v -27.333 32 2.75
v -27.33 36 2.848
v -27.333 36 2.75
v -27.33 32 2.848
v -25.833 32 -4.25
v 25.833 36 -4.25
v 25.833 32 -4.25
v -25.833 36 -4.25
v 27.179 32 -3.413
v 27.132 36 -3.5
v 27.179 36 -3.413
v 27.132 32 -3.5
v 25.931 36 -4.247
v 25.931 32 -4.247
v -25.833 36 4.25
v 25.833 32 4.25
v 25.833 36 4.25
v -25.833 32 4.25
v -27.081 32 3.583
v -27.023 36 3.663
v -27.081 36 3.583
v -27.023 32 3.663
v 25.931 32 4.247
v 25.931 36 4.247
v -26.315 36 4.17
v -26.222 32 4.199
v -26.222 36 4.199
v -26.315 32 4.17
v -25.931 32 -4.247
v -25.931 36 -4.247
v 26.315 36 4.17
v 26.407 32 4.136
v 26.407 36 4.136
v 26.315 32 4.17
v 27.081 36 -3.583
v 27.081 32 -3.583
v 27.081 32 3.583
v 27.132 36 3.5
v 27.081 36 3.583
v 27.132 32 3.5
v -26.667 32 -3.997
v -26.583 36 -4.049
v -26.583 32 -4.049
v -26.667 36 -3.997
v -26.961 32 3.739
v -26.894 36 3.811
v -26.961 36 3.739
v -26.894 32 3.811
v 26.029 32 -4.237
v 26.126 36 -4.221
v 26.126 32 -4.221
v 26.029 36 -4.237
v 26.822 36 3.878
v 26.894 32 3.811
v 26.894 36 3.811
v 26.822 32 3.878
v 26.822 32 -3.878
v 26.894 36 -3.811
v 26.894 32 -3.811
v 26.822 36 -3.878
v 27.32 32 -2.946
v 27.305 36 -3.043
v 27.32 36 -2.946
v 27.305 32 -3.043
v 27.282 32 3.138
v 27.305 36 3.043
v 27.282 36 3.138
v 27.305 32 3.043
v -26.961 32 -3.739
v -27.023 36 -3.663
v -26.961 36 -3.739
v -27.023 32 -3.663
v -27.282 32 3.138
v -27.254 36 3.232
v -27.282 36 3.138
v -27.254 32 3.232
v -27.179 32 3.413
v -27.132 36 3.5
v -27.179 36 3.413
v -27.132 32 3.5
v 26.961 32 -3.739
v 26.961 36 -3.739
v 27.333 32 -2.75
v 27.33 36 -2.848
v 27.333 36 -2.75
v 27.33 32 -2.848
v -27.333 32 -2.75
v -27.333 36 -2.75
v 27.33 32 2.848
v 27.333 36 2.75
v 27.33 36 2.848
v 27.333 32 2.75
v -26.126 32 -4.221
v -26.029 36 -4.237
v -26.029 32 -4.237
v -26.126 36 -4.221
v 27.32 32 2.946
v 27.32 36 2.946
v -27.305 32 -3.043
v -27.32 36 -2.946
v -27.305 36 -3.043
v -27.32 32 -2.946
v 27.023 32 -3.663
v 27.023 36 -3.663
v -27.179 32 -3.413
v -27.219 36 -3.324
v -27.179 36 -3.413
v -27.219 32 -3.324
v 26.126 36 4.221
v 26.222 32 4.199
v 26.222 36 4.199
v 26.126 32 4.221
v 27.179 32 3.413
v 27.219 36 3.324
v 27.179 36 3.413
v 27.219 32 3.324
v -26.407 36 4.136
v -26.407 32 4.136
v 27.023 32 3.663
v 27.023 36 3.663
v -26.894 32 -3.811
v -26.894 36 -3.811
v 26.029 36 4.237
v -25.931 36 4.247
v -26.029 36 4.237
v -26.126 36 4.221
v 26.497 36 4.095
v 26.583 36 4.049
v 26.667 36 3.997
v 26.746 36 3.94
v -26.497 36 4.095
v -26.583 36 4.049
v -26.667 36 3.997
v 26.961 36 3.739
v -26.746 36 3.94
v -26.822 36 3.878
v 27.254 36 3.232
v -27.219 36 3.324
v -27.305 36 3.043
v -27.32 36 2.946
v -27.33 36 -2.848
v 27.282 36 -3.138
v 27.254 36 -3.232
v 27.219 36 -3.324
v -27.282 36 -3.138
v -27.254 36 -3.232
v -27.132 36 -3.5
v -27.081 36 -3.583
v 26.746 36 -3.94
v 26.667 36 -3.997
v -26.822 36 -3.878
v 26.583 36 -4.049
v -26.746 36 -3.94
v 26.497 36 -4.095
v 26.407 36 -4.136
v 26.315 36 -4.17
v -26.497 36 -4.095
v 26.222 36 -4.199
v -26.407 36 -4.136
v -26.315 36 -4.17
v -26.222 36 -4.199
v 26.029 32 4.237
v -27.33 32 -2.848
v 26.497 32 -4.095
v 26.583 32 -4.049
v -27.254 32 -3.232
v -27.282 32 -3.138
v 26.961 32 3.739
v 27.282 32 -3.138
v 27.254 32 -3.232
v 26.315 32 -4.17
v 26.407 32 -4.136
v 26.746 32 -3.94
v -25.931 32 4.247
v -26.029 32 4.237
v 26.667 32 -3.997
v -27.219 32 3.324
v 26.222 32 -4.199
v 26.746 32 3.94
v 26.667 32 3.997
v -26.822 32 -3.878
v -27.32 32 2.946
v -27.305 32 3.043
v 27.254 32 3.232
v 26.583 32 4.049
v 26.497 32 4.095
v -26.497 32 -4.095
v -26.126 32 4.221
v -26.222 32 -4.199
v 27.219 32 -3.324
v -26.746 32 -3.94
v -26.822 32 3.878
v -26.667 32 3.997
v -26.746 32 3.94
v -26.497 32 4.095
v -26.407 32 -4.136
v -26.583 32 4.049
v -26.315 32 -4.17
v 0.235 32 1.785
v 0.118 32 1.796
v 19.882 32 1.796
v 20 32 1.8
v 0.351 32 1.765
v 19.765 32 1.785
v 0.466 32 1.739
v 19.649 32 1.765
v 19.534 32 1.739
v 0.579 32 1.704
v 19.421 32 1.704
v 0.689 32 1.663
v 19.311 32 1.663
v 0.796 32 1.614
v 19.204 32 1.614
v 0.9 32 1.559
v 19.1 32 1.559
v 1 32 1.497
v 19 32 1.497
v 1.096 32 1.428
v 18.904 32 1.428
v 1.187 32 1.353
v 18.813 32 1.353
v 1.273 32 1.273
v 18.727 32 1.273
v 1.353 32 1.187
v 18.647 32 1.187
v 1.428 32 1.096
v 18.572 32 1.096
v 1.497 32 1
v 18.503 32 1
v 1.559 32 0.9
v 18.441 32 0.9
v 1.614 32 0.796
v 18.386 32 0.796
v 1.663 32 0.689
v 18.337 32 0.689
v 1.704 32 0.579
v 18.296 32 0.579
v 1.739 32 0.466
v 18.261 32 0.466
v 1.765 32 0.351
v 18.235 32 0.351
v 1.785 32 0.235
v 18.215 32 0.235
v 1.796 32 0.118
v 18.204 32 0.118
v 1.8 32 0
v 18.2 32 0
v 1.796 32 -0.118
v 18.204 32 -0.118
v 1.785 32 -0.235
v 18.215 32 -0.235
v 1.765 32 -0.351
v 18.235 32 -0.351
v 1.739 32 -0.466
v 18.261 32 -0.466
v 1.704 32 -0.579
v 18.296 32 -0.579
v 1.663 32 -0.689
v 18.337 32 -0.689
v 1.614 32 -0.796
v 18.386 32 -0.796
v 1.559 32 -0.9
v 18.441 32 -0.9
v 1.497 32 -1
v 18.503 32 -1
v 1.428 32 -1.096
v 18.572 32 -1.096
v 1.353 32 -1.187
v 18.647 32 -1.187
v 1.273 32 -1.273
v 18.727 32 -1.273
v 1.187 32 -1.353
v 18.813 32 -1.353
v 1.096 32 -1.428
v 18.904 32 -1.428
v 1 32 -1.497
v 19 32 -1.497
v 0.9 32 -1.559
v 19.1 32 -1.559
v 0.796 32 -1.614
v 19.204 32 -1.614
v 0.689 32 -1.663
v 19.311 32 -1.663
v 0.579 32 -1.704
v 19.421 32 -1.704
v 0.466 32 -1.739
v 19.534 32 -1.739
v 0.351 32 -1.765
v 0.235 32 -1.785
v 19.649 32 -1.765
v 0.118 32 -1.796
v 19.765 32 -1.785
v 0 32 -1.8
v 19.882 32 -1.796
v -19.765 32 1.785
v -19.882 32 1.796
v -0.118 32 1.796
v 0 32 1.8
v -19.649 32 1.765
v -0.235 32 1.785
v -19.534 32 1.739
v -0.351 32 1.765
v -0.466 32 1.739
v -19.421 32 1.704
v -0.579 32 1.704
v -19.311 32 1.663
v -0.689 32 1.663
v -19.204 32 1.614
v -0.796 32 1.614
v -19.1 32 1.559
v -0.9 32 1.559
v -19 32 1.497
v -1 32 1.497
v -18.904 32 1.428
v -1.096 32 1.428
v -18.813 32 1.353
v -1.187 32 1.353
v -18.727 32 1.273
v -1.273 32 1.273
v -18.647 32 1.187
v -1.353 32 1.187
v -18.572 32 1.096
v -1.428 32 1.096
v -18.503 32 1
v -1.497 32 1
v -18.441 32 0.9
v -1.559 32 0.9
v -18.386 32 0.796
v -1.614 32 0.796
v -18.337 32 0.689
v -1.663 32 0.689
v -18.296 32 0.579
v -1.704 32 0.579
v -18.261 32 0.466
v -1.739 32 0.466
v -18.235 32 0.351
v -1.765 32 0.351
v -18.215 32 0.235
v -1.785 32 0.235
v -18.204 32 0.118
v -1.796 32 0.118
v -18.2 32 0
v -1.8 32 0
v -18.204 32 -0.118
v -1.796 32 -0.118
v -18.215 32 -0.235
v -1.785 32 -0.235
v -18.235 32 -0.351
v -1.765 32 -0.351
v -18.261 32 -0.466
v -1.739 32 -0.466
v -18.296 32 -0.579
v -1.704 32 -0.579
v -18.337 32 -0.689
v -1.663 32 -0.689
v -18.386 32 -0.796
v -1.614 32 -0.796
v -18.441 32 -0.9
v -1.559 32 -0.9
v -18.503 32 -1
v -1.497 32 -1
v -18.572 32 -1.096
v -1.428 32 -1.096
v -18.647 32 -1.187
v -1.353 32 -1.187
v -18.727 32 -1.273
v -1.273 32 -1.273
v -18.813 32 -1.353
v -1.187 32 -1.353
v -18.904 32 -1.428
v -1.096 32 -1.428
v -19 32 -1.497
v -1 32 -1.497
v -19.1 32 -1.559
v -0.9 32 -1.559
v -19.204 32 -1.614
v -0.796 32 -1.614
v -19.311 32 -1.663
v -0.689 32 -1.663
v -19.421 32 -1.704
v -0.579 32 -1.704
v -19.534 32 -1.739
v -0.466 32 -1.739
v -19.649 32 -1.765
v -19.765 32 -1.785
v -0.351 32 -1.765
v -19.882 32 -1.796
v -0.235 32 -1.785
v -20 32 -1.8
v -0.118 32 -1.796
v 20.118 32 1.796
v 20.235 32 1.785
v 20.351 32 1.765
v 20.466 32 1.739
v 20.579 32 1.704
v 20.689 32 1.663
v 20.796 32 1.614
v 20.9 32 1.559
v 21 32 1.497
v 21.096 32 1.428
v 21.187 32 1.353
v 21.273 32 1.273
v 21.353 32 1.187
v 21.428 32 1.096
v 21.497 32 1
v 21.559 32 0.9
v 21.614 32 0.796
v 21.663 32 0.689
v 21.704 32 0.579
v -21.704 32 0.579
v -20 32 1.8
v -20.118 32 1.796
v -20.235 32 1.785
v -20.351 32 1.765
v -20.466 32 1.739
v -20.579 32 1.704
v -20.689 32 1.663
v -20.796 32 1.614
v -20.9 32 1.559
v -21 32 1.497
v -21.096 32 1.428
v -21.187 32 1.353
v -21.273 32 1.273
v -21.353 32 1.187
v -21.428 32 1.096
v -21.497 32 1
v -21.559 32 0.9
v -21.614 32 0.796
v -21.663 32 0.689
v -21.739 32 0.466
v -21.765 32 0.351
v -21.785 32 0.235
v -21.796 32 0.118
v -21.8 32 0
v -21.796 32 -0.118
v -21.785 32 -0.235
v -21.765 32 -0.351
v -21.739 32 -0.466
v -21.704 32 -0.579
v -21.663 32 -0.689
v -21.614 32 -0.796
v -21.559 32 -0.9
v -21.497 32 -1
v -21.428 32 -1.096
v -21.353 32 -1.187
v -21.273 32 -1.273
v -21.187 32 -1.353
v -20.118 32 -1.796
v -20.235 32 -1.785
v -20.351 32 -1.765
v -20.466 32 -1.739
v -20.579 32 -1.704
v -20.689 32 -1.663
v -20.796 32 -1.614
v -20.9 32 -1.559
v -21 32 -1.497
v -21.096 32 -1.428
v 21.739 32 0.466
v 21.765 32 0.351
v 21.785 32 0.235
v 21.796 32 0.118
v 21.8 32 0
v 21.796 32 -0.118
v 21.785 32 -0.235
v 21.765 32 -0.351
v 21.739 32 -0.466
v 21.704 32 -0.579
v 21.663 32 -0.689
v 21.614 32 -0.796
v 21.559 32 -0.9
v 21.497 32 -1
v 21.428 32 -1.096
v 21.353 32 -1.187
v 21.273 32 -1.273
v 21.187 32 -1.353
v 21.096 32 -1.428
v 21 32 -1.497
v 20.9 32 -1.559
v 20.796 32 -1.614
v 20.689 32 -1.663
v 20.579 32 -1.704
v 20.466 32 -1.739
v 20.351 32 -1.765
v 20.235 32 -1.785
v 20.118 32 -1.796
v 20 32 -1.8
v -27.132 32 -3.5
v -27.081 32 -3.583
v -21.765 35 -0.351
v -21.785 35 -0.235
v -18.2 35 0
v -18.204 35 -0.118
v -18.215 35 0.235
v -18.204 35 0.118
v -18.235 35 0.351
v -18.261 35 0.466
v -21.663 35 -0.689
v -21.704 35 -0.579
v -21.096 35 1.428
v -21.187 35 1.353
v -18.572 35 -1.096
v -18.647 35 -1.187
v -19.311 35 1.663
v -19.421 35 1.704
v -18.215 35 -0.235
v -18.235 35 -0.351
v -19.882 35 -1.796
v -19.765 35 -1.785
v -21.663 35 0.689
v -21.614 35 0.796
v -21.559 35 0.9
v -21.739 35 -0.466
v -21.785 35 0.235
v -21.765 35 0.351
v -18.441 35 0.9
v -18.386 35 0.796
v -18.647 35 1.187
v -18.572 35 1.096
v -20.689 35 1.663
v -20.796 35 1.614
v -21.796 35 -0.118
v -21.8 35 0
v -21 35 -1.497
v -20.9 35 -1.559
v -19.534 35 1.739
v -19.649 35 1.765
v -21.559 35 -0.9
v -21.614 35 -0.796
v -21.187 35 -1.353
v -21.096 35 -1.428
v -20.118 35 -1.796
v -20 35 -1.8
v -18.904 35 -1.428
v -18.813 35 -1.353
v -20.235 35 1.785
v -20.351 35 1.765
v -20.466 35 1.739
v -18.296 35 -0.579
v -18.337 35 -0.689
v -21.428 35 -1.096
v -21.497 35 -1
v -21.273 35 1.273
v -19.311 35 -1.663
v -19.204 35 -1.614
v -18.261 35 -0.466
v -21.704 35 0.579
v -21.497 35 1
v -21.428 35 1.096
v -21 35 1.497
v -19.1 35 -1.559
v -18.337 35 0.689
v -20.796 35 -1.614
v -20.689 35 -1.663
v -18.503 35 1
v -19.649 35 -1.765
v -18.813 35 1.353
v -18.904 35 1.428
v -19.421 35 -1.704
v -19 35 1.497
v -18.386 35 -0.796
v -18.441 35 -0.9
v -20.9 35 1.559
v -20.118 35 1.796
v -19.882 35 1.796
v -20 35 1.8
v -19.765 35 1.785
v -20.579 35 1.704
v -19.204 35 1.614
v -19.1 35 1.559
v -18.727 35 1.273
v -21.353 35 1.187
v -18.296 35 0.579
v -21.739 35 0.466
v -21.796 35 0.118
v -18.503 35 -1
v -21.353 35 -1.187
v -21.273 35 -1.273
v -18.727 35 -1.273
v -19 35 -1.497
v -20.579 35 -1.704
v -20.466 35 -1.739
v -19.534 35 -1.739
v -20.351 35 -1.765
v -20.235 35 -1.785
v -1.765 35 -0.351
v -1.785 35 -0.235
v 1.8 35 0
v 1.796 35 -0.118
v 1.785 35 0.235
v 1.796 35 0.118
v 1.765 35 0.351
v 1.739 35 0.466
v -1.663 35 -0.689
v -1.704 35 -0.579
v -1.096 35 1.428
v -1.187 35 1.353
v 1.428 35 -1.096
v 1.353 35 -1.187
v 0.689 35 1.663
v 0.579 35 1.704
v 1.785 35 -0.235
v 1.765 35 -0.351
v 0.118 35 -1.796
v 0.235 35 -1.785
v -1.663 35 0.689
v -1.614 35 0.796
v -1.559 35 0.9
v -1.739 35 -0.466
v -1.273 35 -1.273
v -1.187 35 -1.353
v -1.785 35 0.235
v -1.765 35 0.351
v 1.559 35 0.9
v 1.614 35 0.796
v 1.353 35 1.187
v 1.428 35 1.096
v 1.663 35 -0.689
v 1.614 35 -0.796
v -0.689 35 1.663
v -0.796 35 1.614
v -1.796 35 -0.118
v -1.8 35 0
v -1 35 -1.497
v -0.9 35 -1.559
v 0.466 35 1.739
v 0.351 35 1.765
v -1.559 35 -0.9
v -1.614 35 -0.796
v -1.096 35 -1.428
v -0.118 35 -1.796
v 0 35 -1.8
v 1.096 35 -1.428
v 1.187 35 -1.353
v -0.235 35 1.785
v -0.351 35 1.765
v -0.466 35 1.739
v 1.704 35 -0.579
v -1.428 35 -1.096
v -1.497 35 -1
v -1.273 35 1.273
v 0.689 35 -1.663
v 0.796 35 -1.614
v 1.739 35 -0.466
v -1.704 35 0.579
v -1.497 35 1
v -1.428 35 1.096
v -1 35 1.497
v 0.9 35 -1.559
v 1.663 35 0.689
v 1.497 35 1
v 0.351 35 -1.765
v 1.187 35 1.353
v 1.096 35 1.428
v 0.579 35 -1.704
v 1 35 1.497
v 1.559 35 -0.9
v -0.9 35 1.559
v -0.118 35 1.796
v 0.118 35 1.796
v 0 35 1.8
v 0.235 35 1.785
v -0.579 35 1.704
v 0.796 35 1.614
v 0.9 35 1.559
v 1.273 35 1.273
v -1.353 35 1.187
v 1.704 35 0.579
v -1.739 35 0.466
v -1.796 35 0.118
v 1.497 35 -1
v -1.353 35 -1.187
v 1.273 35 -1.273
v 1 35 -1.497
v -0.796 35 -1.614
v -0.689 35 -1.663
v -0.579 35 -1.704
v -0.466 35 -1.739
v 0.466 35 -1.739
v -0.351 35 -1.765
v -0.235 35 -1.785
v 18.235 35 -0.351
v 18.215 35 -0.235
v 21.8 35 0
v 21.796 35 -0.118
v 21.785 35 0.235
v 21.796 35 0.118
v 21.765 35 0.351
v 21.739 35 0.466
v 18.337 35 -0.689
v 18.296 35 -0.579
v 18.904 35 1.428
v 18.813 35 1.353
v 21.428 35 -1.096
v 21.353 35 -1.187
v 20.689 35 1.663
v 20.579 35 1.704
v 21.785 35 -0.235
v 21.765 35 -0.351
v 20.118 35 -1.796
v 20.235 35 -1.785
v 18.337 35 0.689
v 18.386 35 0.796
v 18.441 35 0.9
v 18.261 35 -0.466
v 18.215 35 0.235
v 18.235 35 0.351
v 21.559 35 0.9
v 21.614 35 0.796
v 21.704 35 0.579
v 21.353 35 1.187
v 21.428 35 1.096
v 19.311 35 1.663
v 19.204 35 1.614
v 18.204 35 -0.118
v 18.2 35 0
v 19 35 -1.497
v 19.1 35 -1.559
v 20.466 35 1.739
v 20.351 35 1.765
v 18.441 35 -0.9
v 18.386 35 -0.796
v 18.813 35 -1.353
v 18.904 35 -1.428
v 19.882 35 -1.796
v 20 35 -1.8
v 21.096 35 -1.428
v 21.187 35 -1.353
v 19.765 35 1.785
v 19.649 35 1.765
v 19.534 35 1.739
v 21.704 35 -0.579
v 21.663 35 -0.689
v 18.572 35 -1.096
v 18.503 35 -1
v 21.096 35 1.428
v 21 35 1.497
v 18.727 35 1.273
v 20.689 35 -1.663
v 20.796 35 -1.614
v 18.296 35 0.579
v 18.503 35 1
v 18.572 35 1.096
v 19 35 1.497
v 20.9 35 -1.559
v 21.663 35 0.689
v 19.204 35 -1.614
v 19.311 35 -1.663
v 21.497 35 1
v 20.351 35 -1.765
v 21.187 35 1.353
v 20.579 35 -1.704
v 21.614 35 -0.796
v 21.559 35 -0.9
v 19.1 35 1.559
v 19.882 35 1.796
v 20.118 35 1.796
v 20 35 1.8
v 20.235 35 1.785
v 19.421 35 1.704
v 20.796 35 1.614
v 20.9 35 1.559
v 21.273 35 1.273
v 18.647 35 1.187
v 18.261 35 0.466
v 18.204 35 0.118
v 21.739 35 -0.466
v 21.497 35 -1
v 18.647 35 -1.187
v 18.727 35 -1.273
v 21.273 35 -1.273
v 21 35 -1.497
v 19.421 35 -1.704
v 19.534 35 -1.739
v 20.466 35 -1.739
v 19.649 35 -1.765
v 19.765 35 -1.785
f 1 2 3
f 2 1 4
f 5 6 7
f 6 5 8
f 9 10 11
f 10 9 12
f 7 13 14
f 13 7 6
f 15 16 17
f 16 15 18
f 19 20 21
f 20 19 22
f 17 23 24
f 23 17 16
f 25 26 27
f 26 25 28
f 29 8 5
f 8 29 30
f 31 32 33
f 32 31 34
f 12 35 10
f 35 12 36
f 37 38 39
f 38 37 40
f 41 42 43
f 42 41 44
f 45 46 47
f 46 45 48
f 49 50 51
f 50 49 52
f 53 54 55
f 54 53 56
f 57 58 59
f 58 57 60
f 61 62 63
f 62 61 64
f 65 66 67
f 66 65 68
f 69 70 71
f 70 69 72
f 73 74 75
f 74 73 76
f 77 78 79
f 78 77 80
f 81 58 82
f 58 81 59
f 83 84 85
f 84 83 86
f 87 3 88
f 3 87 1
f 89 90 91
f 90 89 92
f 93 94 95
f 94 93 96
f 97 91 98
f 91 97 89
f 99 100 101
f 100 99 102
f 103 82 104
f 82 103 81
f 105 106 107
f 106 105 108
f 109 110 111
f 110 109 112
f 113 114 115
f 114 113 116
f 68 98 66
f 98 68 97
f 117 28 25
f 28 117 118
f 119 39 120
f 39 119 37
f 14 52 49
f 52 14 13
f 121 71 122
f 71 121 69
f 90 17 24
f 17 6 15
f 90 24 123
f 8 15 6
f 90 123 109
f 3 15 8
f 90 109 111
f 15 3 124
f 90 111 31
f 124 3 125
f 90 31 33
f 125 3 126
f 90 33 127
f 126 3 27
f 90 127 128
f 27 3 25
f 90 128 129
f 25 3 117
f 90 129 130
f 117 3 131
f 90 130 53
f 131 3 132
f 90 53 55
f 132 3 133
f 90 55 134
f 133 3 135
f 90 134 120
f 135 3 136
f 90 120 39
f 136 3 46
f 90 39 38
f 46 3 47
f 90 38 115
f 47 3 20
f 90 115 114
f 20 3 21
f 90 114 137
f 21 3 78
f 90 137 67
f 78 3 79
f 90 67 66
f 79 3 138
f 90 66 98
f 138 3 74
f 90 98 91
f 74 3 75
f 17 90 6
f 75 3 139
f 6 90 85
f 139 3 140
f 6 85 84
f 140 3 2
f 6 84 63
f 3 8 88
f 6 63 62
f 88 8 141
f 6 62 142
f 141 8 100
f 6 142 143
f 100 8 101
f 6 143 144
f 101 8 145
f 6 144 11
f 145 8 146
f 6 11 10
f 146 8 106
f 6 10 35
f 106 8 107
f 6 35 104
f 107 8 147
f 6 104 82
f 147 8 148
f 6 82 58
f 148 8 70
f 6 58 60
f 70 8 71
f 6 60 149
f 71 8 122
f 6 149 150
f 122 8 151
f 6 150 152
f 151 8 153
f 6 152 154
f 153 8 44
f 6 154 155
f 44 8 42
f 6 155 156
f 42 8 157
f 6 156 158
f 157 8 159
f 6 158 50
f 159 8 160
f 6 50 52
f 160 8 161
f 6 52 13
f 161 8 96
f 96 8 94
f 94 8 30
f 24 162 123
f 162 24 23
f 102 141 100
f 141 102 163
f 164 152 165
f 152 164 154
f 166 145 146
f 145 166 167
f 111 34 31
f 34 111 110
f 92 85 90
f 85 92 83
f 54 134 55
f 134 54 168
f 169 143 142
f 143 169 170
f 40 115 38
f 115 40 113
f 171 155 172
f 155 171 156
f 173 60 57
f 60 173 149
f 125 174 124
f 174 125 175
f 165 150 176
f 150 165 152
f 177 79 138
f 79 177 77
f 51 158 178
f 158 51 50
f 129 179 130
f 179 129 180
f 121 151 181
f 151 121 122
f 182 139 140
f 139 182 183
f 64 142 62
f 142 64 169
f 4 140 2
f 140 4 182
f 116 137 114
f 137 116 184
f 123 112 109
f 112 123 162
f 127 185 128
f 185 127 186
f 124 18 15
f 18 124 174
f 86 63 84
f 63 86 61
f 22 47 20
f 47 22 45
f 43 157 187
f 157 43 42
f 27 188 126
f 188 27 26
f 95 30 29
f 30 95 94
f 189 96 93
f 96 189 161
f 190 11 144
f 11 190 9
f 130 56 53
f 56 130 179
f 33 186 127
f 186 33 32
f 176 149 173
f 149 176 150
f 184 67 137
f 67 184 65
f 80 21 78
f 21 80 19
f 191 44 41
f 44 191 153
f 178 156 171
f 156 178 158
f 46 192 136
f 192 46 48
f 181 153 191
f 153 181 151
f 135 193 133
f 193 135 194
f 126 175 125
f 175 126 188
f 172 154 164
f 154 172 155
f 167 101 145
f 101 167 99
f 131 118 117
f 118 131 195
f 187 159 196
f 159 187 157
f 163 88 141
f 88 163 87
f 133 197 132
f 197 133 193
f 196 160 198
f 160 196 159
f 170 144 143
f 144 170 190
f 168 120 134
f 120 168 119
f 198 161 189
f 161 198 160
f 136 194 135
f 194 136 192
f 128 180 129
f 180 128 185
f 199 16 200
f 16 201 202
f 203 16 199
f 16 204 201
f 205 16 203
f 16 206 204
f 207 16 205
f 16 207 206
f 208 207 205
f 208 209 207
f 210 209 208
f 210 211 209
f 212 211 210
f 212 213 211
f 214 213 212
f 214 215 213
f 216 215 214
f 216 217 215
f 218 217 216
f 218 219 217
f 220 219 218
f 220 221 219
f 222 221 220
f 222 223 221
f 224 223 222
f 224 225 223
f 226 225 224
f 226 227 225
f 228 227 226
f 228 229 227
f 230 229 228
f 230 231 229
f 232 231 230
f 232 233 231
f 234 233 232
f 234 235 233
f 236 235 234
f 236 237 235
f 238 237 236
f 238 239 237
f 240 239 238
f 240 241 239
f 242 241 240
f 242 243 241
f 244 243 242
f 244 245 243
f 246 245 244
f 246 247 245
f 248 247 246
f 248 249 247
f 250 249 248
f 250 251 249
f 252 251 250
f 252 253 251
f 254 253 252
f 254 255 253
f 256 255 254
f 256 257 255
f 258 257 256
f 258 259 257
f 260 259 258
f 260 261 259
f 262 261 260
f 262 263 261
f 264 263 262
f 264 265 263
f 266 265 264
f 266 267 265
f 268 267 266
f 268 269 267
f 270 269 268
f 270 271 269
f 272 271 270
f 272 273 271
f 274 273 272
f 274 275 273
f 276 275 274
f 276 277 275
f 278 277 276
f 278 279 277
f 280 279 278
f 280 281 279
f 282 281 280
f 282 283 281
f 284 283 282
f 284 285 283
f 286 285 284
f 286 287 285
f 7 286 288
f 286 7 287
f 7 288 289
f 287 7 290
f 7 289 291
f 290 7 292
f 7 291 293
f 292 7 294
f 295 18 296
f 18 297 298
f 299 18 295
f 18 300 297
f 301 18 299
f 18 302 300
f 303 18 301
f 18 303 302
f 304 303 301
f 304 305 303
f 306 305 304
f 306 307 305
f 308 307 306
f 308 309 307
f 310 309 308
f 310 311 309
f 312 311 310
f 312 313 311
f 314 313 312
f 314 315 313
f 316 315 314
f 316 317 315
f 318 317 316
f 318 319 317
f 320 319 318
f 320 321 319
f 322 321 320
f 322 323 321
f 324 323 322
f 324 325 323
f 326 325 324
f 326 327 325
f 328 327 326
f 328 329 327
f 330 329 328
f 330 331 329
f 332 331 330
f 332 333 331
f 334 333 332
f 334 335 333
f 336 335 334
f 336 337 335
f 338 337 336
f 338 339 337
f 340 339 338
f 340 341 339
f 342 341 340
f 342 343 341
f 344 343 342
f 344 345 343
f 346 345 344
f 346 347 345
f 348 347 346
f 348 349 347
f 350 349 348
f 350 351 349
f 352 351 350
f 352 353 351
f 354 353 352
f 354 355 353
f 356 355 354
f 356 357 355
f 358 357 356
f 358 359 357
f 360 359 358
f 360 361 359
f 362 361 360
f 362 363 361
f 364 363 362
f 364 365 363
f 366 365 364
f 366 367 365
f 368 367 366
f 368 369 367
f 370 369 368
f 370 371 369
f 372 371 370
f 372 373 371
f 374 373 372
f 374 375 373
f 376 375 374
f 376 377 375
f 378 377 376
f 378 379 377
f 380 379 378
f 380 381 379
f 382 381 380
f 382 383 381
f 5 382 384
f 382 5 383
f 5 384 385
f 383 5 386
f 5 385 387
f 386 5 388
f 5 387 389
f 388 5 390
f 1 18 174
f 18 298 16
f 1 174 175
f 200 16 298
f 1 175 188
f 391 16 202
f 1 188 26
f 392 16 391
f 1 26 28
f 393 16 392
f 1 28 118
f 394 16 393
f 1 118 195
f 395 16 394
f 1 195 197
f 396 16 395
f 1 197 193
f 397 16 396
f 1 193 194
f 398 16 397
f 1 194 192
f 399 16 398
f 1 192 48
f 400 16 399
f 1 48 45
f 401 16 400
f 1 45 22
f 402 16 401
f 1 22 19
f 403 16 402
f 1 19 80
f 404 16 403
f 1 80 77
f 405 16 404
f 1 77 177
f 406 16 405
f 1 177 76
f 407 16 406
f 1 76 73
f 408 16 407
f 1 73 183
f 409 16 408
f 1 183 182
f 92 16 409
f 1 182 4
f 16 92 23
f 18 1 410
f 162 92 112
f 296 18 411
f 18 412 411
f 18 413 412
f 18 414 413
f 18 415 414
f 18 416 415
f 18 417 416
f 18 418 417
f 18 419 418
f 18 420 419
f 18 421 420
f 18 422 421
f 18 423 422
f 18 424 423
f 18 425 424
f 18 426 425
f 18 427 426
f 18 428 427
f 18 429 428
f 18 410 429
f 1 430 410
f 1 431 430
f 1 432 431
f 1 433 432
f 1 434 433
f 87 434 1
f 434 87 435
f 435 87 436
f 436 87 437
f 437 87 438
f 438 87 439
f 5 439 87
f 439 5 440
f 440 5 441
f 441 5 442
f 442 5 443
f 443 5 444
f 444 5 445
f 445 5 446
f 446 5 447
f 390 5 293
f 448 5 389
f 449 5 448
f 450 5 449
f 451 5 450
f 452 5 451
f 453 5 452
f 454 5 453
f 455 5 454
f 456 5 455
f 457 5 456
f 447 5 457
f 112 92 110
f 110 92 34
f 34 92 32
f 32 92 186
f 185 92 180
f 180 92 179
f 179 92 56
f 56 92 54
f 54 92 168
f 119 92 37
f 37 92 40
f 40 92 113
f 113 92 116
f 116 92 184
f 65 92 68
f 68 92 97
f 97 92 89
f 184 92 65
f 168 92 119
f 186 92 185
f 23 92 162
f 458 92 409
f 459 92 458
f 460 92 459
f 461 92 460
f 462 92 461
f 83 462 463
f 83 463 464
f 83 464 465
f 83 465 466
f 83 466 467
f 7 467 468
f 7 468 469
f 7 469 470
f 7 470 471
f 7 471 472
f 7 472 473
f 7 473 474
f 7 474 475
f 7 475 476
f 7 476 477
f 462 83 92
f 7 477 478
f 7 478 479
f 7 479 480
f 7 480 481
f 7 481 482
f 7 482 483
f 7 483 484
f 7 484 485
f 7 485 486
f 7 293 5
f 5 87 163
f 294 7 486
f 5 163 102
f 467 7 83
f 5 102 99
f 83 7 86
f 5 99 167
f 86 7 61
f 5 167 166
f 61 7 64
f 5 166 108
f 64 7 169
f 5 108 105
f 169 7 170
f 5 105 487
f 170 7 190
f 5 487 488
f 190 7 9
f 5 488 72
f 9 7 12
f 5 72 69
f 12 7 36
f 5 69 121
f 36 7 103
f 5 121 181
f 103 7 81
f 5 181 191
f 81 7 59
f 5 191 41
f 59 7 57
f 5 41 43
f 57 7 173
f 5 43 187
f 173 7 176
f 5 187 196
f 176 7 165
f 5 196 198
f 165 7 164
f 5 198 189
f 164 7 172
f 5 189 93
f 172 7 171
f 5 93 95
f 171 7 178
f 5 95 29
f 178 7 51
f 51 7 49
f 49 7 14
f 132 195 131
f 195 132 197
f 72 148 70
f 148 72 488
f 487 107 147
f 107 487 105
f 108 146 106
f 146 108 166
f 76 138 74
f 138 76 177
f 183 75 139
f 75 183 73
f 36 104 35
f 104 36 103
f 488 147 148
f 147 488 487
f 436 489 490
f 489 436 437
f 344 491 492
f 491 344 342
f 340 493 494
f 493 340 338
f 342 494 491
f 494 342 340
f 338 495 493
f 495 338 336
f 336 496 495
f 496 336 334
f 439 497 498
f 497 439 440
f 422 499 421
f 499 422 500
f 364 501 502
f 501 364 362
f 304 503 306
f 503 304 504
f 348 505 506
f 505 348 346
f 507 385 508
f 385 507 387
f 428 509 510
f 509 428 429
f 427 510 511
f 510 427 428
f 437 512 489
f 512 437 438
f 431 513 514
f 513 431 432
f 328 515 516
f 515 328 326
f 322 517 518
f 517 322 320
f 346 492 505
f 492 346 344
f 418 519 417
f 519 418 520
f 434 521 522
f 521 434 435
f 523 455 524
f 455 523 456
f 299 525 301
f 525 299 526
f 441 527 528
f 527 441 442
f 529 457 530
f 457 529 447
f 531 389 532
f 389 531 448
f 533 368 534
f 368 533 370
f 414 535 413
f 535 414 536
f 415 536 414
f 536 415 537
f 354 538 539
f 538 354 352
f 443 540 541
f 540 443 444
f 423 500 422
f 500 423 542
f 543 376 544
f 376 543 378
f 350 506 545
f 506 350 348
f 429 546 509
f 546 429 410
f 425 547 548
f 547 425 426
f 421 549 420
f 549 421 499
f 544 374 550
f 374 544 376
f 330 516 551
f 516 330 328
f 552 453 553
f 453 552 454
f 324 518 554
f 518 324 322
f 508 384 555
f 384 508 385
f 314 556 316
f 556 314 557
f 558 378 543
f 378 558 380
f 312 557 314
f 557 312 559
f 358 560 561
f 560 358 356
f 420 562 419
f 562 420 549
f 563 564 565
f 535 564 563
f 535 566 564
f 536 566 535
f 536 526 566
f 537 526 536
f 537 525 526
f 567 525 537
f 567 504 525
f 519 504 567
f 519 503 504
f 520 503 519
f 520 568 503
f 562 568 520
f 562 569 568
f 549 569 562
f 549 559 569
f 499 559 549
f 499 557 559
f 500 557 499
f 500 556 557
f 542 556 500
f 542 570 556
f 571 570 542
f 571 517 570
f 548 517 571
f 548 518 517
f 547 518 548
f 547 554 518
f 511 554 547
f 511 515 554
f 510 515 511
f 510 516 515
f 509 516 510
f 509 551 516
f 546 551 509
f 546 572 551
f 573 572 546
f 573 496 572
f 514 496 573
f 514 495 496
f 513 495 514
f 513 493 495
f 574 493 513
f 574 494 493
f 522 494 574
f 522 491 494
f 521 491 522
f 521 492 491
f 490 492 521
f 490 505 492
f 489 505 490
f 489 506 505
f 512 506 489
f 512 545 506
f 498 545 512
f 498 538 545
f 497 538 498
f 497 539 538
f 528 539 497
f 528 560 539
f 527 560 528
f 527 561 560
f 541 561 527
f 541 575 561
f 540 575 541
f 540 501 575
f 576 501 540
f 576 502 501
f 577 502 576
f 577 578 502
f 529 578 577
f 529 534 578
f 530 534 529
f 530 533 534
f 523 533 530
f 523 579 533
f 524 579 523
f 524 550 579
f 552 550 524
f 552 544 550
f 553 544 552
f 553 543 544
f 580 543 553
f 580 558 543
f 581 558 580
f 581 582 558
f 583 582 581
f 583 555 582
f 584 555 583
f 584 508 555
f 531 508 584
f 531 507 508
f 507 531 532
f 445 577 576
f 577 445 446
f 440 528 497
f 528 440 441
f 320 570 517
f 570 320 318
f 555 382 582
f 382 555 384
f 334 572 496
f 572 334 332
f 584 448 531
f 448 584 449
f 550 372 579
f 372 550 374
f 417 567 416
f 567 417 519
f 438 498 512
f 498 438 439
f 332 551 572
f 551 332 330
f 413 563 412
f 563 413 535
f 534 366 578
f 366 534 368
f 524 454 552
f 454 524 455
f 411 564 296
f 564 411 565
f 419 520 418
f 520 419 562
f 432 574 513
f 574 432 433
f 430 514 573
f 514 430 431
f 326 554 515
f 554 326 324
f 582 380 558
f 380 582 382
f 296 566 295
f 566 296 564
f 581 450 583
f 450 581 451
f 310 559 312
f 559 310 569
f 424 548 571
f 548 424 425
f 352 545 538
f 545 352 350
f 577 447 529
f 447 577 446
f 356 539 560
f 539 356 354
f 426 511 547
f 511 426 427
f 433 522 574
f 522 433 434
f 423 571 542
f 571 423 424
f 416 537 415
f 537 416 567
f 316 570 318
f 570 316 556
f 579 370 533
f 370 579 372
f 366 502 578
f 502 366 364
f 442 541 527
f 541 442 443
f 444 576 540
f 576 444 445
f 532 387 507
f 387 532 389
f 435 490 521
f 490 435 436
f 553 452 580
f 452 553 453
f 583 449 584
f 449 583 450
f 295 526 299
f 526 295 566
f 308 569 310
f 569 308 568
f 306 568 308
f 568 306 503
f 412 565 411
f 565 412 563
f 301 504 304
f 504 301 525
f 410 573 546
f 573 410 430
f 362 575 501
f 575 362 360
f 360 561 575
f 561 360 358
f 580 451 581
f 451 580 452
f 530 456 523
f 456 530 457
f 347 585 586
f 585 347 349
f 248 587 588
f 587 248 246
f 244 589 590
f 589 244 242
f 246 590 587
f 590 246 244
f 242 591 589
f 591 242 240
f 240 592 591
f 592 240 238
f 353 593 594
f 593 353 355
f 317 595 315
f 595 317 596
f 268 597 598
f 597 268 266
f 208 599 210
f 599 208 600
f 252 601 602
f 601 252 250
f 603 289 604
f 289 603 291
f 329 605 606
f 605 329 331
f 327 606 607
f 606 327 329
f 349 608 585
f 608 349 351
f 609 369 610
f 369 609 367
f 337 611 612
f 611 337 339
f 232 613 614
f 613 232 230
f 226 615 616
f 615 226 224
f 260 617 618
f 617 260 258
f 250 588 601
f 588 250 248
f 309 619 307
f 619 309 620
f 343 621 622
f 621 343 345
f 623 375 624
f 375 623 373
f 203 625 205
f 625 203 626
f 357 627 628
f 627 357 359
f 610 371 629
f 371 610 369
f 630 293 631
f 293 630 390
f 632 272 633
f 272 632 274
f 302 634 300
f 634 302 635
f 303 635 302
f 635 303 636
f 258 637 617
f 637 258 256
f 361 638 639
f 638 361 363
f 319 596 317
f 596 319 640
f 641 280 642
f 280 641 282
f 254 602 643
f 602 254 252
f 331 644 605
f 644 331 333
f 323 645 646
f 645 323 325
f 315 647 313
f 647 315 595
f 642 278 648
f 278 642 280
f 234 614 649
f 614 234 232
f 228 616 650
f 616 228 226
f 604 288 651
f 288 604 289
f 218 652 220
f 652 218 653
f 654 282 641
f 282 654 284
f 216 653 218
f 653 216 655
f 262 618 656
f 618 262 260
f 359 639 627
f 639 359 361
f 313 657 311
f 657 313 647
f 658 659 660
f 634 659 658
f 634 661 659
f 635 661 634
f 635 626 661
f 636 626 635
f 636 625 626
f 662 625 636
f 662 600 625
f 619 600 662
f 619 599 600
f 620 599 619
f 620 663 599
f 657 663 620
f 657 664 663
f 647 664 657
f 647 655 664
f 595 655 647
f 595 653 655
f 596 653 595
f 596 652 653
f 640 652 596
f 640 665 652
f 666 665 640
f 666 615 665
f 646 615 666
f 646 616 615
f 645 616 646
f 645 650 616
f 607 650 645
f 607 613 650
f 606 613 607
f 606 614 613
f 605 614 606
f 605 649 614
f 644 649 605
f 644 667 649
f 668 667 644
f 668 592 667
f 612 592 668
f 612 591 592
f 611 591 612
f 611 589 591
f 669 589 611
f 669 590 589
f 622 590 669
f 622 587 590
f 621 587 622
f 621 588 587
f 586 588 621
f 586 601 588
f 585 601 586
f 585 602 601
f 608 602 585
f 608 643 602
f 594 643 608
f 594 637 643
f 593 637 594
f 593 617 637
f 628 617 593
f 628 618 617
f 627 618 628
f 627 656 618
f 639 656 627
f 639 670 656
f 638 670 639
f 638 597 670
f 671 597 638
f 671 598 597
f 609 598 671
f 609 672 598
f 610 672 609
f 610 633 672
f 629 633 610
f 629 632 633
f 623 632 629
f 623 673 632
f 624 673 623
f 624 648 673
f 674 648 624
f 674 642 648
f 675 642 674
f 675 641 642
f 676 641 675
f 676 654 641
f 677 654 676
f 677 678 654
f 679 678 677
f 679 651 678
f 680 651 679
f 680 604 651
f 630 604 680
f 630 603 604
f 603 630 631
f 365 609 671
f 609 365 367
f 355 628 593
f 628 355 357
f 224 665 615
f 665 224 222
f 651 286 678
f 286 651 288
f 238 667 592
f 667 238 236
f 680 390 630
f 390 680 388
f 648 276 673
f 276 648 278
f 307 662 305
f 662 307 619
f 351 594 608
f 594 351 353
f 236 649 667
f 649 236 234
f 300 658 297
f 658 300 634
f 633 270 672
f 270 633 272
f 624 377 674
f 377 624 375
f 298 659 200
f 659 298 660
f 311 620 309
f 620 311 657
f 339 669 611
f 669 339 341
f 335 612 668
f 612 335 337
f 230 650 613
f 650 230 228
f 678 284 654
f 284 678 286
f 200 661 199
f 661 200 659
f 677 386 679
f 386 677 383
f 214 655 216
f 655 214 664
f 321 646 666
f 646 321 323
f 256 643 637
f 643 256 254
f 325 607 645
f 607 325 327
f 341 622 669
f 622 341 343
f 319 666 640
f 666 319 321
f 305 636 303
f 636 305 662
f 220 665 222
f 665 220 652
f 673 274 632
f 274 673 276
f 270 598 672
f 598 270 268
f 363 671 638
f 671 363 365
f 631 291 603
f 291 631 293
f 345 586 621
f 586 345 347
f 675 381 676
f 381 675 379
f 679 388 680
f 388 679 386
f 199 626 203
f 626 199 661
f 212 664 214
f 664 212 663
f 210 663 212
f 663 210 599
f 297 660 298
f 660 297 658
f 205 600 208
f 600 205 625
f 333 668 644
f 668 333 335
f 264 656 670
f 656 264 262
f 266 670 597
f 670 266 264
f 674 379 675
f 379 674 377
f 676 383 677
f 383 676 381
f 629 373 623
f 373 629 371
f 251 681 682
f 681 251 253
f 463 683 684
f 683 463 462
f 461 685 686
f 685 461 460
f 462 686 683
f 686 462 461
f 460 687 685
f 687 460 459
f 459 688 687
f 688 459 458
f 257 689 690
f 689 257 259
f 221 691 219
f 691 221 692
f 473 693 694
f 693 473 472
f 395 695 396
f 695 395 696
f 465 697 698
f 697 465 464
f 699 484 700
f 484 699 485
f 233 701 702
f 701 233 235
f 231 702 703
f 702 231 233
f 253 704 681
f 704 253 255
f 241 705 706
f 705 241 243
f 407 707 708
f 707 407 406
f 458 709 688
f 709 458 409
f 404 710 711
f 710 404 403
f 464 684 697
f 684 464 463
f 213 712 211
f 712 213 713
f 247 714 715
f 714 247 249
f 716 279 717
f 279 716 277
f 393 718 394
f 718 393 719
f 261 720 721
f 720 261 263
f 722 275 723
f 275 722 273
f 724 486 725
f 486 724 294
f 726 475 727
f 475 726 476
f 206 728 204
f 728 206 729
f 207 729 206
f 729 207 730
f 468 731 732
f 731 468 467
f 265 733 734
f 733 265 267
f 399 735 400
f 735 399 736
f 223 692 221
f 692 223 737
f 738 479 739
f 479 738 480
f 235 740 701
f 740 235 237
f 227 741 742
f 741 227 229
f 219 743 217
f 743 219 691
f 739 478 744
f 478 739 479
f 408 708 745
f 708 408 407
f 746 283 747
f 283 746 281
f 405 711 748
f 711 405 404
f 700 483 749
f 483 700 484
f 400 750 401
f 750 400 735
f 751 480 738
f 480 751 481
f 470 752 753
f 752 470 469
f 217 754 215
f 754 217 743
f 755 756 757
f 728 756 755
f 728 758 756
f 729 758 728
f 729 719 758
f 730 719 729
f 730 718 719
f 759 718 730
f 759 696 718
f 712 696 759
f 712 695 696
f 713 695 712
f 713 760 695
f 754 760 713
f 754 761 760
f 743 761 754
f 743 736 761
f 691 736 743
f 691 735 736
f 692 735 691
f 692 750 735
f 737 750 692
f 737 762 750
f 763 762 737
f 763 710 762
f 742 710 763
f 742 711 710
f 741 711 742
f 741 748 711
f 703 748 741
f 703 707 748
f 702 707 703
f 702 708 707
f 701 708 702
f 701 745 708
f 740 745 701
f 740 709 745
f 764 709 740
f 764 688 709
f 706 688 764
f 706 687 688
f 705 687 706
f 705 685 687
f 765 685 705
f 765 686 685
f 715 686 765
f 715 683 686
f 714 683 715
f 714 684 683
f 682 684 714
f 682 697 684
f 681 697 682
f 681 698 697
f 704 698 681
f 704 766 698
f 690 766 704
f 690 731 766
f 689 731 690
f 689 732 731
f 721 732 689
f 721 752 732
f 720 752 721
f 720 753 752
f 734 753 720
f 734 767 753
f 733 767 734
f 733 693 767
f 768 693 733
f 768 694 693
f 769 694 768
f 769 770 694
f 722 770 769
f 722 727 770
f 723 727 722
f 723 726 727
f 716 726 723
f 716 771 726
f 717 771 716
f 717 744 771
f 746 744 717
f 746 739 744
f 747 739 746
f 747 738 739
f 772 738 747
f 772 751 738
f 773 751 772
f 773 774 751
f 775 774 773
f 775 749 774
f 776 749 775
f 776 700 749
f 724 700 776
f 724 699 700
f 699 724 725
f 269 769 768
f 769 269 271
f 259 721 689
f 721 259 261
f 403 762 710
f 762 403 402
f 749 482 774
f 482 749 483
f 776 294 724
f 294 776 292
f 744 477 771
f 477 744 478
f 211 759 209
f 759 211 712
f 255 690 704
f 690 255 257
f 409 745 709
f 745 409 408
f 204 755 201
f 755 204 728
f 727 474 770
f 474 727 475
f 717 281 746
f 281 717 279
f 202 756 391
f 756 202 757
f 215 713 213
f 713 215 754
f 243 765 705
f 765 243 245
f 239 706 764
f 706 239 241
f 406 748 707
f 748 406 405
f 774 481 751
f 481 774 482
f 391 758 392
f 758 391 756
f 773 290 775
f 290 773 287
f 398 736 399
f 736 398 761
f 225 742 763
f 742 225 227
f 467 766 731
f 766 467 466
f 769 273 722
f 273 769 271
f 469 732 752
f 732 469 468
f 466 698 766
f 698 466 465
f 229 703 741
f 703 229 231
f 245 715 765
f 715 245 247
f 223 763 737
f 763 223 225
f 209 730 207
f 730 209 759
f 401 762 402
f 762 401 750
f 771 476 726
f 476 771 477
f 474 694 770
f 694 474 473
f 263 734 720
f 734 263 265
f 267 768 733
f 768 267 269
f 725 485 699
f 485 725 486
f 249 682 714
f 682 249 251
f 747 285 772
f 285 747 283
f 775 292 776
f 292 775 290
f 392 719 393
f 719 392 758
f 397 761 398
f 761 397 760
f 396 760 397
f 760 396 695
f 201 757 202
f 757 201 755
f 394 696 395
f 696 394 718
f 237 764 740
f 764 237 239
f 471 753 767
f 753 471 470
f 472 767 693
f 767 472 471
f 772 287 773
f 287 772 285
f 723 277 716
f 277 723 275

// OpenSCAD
projectWidth=58;
projectHeight=29;
projectDepth=26;
holeDis=3;

caseWidthB=80;
caseHeightB=40;
caseDepthB=28;

caseWidthT=80;
caseHeightT=40;
caseDepthT=2;

dispayWidth=48;
displayHeight=16;



/*********************** MAIN ************************************/

/* *
difference() {	
	bottomCase(caseWidthB,caseHeightB,caseDepthB);
	translate([0,-2,0]) firebeetle(projectWidth+1,projectHeight+1,projectDepth+2,holeDis,false,dispayWidth,displayHeight+1);
}
/* */

/* *
difference() {
	translate([0,0,10]) topCase(caseWidthT,caseHeightT,caseDepthT);
	translate([0,-2,5]) firebeetle(projectWidth+1,projectHeight+1,projectDepth+2,holeDis,false,dispayWidth,displayHeight+1);
}
/* */

/* */
translate([0,15.5,0]) snooze(caseWidthB-1,caseHeightB-1);
/* */

/*********************** MODULE **********************************/

module firebeetle(x,y,z,hd,hole,dW,dH) {
	color("blue")
	difference() {
		translate([0,0,3.5]) cube([x,y,z-7],center=true); // firebeetle ESP32+matrix
		if (hole) {
			translate([(x/2)-hd,(y/2)-hd,0]) cylinder(r=1.3, h=z+4, center=true, $fn=96);
			translate([-(x/2)+hd,(y/2)-hd,0]) cylinder(r=1.3, h=z+4, center=true, $fn=96);
			translate([(x/2)-hd,-(y/2)+hd,0]) cylinder(r=1.3, h=z+4, center=true, $fn=96);
			translate([-(x/2)+hd,-(y/2)+hd,0]) cylinder(r=1.3, h=z+4, center=true, $fn=96);
		}
	}
	if (!hole) {
		translate([(x/2)-hd,(y/2)-hd,0]) cylinder(r=1.3, h=z, center=true, $fn=96);
		translate([-(x/2)+hd,(y/2)-hd,0]) cylinder(r=1.3, h=z, center=true, $fn=96);
		translate([(x/2)-hd,-(y/2)+hd,0]) cylinder(r=1.3, h=z, center=true, $fn=96);
		translate([-(x/2)+hd,-(y/2)+hd,0]) cylinder(r=1.3, h=z, center=true, $fn=96);
	}
	
	hull() {
		translate([(dW/2),(dH/2),(z/2)+5]) cylinder(r=1.5, h=10, center=true, $fn=96);
		translate([-(dW/2),(dH/2),(z/2)+5]) cylinder(r=1.5, h=10, center=true, $fn=96);
		translate([(dW/2),-(dH/2),(z/2)+5]) cylinder(r=1.5, h=10, center=true, $fn=96);
		translate([-(dW/2),-(dH/2),(z/2)+5]) cylinder(r=1.5, h=10, center=true, $fn=96);
	}
}

module bottomCase(x,y,z) {
	color("white")
		difference() {
			hull() {
				translate([(x/2),(y/2),-(z-projectDepth)/2]) cylinder(r=1.5, h=z, center=true, $fn=96);
				translate([-(x/2),(y/2),-(z-projectDepth)/2]) cylinder(r=1.5, h=z, center=true, $fn=96);
				translate([(x/2),-(y/2),-(z-projectDepth)/2]) cylinder(r=1.5, h=z, center=true, $fn=96);
				translate([-(x/2),-(y/2),-(z-projectDepth)/2]) cylinder(r=1.5, h=z, center=true, $fn=96);
			}
			
			hull() {
				translate([(x/2)-1.5,(y/2)-(holeDis*2)-2,0]) cylinder(r=1.5, h=z, center=true, $fn=96);
				translate([-(x/2)+1.5,(y/2)-(holeDis*2)-2,0]) cylinder(r=1.5, h=z, center=true, $fn=96);
				translate([(x/2)-1.5,-(y/2)+(holeDis*2),0]) cylinder(r=1.5, h=z, center=true, $fn=96);
				translate([-(x/2)+1.5,-(y/2)+(holeDis*2),0]) cylinder(r=1.5, h=z, center=true, $fn=96);
			}
			hull() {
				translate([(x/2)-(holeDis*2)-1.5,(y/2)-2,0]) cylinder(r=1.5, h=z, center=true, $fn=96);
				translate([-(x/2)+(holeDis*2)+1.5,(y/2)-2,0]) cylinder(r=1.5, h=z, center=true, $fn=96);
				translate([(x/2)-(holeDis*2)-1.5,-(y/2)+2,0]) cylinder(r=1.5, h=z, center=true, $fn=96);
				translate([-(x/2)+(holeDis*2)+1.5,-(y/2)+2,0]) cylinder(r=1.5, h=z, center=true, $fn=96);
			}
			
			translate([0,y/2,0]) rotate([90,0,0])
			hull() {
				translate([(x/3),(y/12),0]) cylinder(r=1.5, h=z, center=true, $fn=96);
				translate([-(x/3),(y/12),0]) cylinder(r=1.5, h=z, center=true, $fn=96);
				translate([(x/3),-(y/12),0]) cylinder(r=1.5, h=z, center=true, $fn=96);
				translate([-(x/3),-(y/12),0]) cylinder(r=1.5, h=z, center=true, $fn=96);
			}
			
			/*** button holes ***/
			translate([x/2,3,0]) rotate([90,0,90]) cylinder(r=2,h=5,center=true,$fn=96);
			translate([x/2,-8,0]) rotate([90,0,90]) cylinder(r=2,h=5,center=true,$fn=96);
			
			/*** nuts holes ***/
			translate([(x/2)-(holeDis/2)-1,(y/2)-(holeDis/2)-1,2]) cylinder(r=1.3,h=z,center=true,$fn=96);
			translate([-(x/2)+(holeDis/2)+1,(y/2)-(holeDis/2)-1,2]) cylinder(r=1.3,h=z,center=true,$fn=96);
			translate([(x/2)-(holeDis/2)-1,-(y/2)+(holeDis/2)+1,2]) cylinder(r=1.3,h=z,center=true,$fn=96);
			translate([-(x/2)+(holeDis/2)+1,-(y/2)+(holeDis/2)+1,2]) cylinder(r=1.3,h=z,center=true,$fn=96);
			
			/*** power hole ****/
			translate([-40,-(projectHeight/2)+8,-(z/2)+12]) cube([20,16,10],center=true);
			
			/*** support hole ***/
			hull() {
				translate([(x/2)+(holeDis/2)-.5,12,0]) rotate([90,0,90]) cylinder(r=2,h=2,center=true,$fn=96);
				translate([(x/2)+holeDis/1.5,12,-z]) rotate([90,0,90]) cylinder(r=2,h=2,center=true,$fn=96);
			}
			hull() {
				translate([-(x/2)-(holeDis/2)+.5,12,0]) rotate([90,0,90]) cylinder(r=2,h=2,center=true,$fn=96);
				translate([-(x/2)-holeDis/1.5,12,-z]) rotate([90,0,90]) cylinder(r=2,h=2,center=true,$fn=96);
			}
		}
		
		/*** firebeetle mount ***/
		pW=projectWidth-4;
		pH=projectHeight-4;
		pD=projectDepth-2.5;
		
		translate([(pW/2)-.5,(pH/2)-2.5,-(pD/2)]) cylinder(r=3, h=5, center=true, $fn=96);
		translate([-(pW/2)+.5,(pH/2)-2.5,-(pD/2)]) cylinder(r=3, h=5, center=true, $fn=96);
		translate([(pW/2)-.5,-(pH/2)-1.5,-(pD/2)]) cylinder(r=3, h=5, center=true, $fn=96);
		translate([-(pW/2)+.5,-(pH/2)-1.5,-(pD/2)]) cylinder(r=3, h=5, center=true, $fn=96);
		
		/*** separator; snowooze button support ***/
		difference() {
			hull() {
				translate([(x/2)-(holeDis),(y/2)-5.5,-.5]) cylinder(r=.8, h=z-1, center=true, $fn=96);
				translate([-(x/2)+(holeDis),(y/2)-5.5,-.5]) cylinder(r=.8, h=z-1, center=true, $fn=96);
			}
			translate([-20,17,0]) rotate([90,0,0]) union() { // button support
				cube([7,7,2],center=true);
				translate([0,4,0]) cube([7,2,7],center=true);
				translate([0,-4,0]) cube([7,2,7],center=true);
			}
			translate([0,17,0]) rotate([90,0,0]) union() { // button support
				cube([7,7,2],center=true);
				translate([0,4,0]) cube([7,2,7],center=true);
				translate([0,-4,0]) cube([7,2,7],center=true);
			}
			translate([20,17,0]) rotate([90,0,0]) union() { // button support
				cube([7,7,2],center=true);
				translate([0,4,0]) cube([7,2,7],center=true);
				translate([0,-4,0]) cube([7,2,7],center=true);
			}
		}
		
		// settings buttons
		difference() {
			translate([(x/2)-1.5,3,0]) cube([5,10,15],center=true);
			translate([(x/2)-1.5,3,0]) cube([6,7,17],center=true);
		}
		difference() {
			translate([(x/2)-1.5,-8,0]) cube([5,10,15],center=true);
			translate([(x/2)-1.5,-8,0]) cube([6,7,17],center=true);
		}
		
}

module topCase(x,y,z) {
	
	z=z*2;
	
	color("white")
		difference() {
			hull() {
				translate([(x/2),(y/2),-(z-projectDepth)/2]) cylinder(r=1.5, h=z, center=true, $fn=96);
				translate([-(x/2),(y/2),-(z-projectDepth)/2]) cylinder(r=1.5, h=z, center=true, $fn=96);
				translate([(x/2),-(y/2),-(z-projectDepth)/2]) cylinder(r=1.5, h=z, center=true, $fn=96);
				translate([-(x/2),-(y/2),-(z-projectDepth)/2]) cylinder(r=1.5, h=z, center=true, $fn=96);
			}
			
			/*** nuts holes ***/
			translate([(x/2)-(holeDis/2)-1,(y/2)-(holeDis/2)-1,-(z-projectDepth)/2]) cylinder(r1=1.4,r2=3.3,h=z+1,center=true,$fn=96);
			translate([-(x/2)+(holeDis/2)+1,(y/2)-(holeDis/2)-1,-(z-projectDepth)/2]) cylinder(r1=1.4,r2=3.3,h=z+1,center=true,$fn=96);
			translate([(x/2)-(holeDis/2)-1,-(y/2)+(holeDis/2)+1,-(z-projectDepth)/2]) cylinder(r1=1.4,r2=3.3,h=z+1,center=true,$fn=96);
			translate([-(x/2)+(holeDis/2)+1,-(y/2)+(holeDis/2)+1,-(z-projectDepth)/2]) cylinder(r1=1.4,r2=3.3,h=z+1,center=true,$fn=96);
			
			/*** hole head firebeetle ***/
			fx=projectWidth+1;
			fy=projectHeight+1;
			fz=projectDepth+2;
			hd=3;
			hull() {
				translate([(fx/2)-hd,(fy/2)-hd,fz/2-4]) cylinder(r=2.5, h=3, center=true, $fn=96);
				translate([-(fx/2)+hd,(fy/2)-hd,fz/2-4]) cylinder(r=2.5, h=3, center=true, $fn=96);
				translate([(fx/2)-hd,-(fy/2)+hd,fz/2-4]) cylinder(r=2.5, h=3, center=true, $fn=96);
				translate([-(fx/2)+hd,-(fy/2)+hd,fz/2-4]) cylinder(r=2.5, h=3, center=true, $fn=96);
			}
		}
}


module snooze(x,y) {
		translate([0,y/2,0]) rotate([90,0,0]) {
			difference() {
				union() {	
					hull() {
						translate([(x/3)-.5,(y/12)-.5,1]) cylinder(r=1.5, h=4, center=true, $fn=96);
						translate([-(x/3)+.5,(y/12)-.5,1]) cylinder(r=1.5, h=4, center=true, $fn=96);
						translate([(x/3)-.5,-(y/12)+.5,1]) cylinder(r=1.5, h=4, center=true, $fn=96);
						translate([-(x/3)+.5,-(y/12)+.5,1]) cylinder(r=1.5, h=4, center=true, $fn=96);
					}
					
				}
				
				translate([-20,0,2]) cylinder(r=1.8, h=4, center=true, $fn=96);
				translate([0,0,2]) cylinder(r=1.8, h=4, center=true, $fn=96);
				translate([20,0,2]) cylinder(r=1.8, h=4, center=true, $fn=96);
			}
		}
}
